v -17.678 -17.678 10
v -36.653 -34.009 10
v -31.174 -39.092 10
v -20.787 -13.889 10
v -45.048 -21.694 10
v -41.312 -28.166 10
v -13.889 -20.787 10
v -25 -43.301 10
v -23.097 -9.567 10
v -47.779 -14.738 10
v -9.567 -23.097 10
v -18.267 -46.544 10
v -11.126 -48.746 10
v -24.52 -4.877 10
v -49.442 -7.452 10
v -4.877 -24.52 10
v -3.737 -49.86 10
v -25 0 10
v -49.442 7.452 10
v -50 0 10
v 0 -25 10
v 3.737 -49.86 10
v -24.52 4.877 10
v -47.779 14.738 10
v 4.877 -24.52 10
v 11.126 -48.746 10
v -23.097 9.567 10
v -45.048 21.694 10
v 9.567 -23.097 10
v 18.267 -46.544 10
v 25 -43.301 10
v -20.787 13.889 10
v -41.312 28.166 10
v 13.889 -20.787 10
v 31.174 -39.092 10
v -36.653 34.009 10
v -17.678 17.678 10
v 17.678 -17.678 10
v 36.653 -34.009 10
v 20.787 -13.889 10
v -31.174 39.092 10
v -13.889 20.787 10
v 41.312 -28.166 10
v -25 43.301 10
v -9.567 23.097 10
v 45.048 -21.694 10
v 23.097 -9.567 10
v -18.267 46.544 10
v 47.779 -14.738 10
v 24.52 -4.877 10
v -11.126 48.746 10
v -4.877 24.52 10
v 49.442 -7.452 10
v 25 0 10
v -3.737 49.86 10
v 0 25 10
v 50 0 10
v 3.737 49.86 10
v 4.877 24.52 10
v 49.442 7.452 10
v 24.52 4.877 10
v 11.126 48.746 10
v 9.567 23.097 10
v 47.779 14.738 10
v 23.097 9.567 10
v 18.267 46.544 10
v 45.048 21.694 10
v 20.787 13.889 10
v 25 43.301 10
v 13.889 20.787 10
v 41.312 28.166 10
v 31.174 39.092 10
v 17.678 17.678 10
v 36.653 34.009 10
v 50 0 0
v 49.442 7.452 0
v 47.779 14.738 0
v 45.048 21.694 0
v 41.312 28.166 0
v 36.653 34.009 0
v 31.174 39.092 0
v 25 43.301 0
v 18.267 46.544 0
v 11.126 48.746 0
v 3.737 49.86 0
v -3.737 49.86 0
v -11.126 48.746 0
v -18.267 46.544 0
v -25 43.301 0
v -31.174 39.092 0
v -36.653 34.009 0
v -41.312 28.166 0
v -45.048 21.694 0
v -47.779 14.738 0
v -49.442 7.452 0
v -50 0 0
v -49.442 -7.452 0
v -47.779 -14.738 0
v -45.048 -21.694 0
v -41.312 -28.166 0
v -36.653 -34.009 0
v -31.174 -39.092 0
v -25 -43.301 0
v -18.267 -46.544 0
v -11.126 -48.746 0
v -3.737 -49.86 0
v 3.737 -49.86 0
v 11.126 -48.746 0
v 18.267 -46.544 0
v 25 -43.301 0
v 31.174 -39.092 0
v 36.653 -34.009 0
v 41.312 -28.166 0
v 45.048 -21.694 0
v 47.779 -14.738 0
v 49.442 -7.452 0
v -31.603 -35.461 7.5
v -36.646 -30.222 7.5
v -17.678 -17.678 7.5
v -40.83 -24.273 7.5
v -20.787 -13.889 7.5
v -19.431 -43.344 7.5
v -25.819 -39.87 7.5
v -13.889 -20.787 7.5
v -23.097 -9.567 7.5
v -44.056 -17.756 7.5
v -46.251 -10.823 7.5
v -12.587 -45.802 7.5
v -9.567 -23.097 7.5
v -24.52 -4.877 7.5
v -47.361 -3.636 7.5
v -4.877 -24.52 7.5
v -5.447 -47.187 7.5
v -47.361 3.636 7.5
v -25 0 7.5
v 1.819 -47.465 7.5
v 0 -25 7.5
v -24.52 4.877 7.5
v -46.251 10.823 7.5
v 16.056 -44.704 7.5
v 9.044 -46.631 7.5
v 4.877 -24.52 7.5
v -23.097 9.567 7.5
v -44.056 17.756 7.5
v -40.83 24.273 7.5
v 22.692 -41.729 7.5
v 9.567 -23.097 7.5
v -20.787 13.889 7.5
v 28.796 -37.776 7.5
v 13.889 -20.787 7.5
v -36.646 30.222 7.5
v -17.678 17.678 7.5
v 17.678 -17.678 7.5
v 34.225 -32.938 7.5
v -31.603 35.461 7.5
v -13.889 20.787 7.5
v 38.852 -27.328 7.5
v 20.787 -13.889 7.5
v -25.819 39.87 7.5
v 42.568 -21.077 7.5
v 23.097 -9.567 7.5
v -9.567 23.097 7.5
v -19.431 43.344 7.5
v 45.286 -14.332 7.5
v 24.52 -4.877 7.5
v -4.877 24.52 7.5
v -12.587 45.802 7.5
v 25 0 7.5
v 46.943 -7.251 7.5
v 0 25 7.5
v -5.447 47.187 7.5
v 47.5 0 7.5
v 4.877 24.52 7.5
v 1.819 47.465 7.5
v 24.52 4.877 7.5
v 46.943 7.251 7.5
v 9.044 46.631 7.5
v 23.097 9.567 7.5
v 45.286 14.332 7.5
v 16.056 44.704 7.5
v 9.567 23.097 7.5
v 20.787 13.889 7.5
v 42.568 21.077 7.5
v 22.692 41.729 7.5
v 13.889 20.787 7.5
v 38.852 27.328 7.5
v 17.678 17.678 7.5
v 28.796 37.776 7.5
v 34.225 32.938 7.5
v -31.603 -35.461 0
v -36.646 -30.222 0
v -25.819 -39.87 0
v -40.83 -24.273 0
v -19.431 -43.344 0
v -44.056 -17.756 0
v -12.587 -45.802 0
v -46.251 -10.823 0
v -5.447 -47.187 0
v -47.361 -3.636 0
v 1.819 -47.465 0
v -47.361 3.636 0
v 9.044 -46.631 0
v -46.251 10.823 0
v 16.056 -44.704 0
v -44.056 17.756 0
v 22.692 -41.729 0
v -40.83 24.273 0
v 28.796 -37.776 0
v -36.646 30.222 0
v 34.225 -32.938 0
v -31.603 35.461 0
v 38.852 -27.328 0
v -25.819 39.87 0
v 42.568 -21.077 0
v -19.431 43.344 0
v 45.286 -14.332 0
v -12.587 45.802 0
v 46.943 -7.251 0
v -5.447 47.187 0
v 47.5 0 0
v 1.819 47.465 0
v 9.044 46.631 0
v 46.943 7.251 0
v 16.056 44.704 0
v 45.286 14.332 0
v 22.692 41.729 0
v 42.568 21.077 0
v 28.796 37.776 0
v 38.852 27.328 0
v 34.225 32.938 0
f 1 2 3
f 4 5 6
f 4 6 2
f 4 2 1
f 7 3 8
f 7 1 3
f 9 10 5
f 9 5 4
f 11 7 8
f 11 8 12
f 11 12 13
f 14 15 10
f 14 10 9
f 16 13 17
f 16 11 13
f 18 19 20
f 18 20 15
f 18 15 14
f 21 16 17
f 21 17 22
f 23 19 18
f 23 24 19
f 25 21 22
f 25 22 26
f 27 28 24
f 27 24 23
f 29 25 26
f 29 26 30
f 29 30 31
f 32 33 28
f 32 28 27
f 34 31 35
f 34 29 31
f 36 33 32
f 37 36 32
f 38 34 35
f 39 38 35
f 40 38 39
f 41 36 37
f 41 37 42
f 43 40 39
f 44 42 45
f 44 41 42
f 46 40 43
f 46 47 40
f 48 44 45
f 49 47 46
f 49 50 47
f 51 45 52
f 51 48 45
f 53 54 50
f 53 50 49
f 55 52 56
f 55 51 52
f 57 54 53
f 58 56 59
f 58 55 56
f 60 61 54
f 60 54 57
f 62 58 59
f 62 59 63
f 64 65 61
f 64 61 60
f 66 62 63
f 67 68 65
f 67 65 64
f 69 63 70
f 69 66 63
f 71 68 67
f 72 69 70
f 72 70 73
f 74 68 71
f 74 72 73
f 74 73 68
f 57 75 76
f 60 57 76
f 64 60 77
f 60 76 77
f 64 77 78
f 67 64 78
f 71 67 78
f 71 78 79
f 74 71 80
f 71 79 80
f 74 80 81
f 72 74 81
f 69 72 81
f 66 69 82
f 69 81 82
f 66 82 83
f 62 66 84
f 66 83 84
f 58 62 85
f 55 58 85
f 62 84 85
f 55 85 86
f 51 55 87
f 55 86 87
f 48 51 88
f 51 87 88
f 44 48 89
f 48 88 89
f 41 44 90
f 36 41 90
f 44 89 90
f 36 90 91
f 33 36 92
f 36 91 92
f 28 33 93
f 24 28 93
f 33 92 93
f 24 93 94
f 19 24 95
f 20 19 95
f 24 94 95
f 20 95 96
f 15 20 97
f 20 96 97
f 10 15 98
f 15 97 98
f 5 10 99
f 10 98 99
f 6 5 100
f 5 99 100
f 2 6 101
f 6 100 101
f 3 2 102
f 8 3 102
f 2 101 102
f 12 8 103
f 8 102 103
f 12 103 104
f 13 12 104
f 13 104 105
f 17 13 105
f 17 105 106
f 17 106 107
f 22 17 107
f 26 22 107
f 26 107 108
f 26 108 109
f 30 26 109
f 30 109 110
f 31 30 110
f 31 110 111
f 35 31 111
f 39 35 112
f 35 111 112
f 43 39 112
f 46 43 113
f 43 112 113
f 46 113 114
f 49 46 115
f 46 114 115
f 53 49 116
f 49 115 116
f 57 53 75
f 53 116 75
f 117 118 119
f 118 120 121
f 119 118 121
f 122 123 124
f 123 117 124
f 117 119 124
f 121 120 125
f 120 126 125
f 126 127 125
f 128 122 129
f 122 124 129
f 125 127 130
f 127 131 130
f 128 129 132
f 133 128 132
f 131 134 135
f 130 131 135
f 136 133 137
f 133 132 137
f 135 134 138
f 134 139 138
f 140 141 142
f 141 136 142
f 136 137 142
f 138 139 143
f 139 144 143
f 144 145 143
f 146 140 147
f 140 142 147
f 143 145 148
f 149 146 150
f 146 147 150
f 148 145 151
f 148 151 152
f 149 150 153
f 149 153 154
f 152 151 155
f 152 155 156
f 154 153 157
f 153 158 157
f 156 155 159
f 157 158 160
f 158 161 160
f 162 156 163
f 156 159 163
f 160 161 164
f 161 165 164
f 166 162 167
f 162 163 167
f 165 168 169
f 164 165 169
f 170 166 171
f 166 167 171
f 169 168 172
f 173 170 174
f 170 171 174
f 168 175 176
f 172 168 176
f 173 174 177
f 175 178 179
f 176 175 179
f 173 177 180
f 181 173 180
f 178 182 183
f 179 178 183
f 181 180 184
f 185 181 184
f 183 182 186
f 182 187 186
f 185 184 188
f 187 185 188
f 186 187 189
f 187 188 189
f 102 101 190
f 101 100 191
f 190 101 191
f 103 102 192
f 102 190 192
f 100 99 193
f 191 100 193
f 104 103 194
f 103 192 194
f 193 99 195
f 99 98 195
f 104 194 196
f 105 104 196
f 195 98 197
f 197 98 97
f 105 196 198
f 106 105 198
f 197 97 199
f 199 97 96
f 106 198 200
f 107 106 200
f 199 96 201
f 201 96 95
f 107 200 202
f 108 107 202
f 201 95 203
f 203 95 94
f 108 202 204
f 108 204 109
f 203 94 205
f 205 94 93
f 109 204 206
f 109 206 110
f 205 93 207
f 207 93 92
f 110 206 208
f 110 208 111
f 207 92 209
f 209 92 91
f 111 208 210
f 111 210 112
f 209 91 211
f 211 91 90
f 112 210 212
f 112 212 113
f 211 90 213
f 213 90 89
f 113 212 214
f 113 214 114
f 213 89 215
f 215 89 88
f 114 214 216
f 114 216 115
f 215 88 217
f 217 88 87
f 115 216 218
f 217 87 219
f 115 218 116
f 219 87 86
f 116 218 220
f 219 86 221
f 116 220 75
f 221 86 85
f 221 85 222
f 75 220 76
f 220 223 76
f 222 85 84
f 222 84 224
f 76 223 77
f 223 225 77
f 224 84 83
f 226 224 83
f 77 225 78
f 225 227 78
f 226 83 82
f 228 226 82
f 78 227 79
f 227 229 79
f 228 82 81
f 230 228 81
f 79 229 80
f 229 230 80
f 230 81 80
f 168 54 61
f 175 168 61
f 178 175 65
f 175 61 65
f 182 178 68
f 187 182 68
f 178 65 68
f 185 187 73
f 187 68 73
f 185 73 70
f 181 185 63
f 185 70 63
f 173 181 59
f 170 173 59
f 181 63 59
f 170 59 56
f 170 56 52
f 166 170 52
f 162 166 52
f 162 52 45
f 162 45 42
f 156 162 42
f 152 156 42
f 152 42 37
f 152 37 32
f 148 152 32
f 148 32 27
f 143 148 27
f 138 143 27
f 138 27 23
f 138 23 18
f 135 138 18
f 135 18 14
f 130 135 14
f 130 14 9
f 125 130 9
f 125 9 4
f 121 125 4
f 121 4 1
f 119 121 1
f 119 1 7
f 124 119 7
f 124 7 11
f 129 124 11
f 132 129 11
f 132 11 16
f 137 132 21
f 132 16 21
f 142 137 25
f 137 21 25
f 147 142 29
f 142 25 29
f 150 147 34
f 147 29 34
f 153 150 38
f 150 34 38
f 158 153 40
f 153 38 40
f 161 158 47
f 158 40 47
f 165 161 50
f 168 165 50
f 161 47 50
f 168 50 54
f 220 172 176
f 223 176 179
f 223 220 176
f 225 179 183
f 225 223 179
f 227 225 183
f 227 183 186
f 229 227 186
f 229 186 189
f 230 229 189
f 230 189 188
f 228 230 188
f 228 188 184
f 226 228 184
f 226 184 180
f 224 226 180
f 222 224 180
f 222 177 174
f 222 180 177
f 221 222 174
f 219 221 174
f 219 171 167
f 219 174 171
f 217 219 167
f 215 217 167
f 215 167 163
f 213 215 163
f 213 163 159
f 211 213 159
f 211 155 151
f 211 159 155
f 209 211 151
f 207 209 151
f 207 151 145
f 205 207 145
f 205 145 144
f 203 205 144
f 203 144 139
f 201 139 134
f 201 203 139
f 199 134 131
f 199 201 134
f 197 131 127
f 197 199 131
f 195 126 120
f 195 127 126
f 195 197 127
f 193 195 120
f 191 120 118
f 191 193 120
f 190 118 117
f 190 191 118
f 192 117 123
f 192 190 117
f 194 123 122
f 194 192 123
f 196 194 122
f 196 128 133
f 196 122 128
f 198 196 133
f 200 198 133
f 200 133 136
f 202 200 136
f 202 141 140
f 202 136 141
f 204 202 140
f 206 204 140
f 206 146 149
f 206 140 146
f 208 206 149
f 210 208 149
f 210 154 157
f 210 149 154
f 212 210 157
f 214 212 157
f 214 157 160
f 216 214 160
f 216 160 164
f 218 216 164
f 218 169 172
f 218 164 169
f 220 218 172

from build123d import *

# Parameters (mm, degrees)
F0_R     = 50
F1_DEPTH = 10
F2_T     = -2.5
F3_R     = 25
F4_DEPTH = 25


with BuildPart() as f1:
    # F0 (on Top) → F1 (new body)
    with BuildSketch(Plane.XY):
        Circle(F0_R)
    extrude(amount=F1_DEPTH)

    # F2
    f2_openings = [f1.faces().sort_by_distance(p)[0] for p in [
        (0, 0, 0),
    ]]
    offset(amount=F2_T, openings=f2_openings)

    # F3 (on face) → F4 (cut)
    with BuildSketch(Plane.XY.offset(10)):
        Circle(F3_R)
    extrude(amount=-F4_DEPTH, mode=Mode.SUBTRACT)


solid = f1.part
